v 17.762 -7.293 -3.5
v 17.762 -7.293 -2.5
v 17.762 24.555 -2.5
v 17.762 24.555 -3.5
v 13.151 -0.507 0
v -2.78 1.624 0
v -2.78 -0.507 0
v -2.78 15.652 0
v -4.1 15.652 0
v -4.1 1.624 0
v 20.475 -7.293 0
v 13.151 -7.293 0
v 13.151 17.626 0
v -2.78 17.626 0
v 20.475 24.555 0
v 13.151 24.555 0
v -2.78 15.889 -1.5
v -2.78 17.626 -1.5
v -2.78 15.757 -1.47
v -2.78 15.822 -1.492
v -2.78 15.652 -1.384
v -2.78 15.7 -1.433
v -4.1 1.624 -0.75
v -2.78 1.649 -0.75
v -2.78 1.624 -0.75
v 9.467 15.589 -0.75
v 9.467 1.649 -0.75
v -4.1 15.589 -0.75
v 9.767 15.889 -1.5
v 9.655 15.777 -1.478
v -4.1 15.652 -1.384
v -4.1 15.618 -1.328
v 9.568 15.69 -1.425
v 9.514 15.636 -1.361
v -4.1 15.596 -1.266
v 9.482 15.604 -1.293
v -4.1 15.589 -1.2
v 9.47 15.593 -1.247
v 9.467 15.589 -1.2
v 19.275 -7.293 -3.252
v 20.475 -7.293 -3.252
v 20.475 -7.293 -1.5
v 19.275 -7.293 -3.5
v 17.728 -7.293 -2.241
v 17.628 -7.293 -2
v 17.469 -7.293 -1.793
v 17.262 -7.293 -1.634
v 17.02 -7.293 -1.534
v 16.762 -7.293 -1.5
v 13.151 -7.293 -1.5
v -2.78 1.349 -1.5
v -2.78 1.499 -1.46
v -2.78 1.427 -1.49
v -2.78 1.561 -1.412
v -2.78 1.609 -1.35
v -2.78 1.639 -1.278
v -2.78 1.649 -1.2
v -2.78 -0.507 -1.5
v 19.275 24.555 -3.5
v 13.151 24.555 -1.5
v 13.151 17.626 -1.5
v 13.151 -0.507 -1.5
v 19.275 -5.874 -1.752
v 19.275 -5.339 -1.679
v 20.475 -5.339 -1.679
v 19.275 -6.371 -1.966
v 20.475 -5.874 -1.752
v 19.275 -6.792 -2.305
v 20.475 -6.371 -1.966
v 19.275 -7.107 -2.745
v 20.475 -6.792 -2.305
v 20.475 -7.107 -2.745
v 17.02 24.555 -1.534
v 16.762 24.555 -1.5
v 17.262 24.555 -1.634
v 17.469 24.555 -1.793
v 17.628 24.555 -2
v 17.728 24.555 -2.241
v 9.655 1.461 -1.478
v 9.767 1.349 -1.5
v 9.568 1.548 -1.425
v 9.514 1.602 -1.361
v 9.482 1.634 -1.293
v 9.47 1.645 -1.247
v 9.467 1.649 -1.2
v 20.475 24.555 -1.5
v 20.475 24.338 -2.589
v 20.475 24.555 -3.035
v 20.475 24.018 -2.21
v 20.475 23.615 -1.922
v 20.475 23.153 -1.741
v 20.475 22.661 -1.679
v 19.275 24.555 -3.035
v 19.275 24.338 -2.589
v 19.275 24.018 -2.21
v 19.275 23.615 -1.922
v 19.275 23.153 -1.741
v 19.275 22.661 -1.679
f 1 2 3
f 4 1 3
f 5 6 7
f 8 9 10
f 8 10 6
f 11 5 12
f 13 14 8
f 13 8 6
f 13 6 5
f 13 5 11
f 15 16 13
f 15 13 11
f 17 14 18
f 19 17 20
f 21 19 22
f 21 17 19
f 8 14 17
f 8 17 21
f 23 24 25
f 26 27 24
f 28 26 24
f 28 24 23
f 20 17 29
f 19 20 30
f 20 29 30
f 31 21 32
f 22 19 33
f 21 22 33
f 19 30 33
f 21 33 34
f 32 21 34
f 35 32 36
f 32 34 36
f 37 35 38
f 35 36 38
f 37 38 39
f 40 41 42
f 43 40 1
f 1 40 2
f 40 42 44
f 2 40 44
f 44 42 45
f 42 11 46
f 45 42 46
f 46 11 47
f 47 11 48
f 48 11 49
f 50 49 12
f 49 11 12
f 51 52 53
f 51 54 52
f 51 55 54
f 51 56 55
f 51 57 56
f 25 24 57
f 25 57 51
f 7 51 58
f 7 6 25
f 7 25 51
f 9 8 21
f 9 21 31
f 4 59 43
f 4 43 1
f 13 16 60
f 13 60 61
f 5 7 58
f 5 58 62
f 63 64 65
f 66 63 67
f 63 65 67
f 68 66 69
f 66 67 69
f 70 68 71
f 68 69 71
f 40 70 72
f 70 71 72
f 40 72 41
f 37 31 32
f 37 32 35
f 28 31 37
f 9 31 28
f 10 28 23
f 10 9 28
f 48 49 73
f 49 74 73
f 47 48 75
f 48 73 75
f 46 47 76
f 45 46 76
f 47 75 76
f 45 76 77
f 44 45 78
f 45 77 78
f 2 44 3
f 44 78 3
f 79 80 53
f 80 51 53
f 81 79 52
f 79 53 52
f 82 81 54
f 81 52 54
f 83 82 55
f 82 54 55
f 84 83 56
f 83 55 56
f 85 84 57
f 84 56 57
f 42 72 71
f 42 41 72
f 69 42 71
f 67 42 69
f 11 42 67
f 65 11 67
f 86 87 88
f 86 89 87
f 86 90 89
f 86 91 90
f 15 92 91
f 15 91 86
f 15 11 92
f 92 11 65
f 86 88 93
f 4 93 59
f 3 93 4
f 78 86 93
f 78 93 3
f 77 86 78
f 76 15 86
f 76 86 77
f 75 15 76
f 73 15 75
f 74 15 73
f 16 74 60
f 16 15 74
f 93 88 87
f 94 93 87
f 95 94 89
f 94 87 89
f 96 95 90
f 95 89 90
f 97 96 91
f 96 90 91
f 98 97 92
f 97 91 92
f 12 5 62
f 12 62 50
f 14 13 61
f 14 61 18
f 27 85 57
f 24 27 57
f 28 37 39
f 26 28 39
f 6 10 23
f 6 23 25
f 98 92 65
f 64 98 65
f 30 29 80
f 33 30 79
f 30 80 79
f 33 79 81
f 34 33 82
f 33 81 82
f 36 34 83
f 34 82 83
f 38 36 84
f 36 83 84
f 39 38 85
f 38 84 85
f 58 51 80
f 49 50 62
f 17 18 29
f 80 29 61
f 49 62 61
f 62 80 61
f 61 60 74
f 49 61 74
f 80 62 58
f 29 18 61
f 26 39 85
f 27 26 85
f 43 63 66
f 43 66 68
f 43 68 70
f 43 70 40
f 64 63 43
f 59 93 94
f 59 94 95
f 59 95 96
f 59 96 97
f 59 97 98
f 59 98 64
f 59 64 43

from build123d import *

# Parameters (mm, degrees)
BOSS_EXTRUDE1_DEPTH = 1.5
SKETCH2_W           = 2.713539356
SKETCH2_H           = 31.847242959
BOSS_EXTRUDE2_DEPTH = 2
CUT_EXTRUDE1_DEPTH  = 0.75
FILLET1_R           = 1
FILLET2_R           = 0.3
CUT_EXTRUDE2_DEPTH  = 1.2


with BuildPart() as part:
    # Sketch1 → Boss-Extrude1 (new body)
    with BuildSketch(Plane.XY):
        Polygon((13.150722075, -0.506964629), (13.150722075, -7.292554302), (20.475117676, -7.292554302), (20.475117676, 24.554688657), (13.150722075, 24.554688657), (13.150722075, 17.625640453), (-2.779550764, 17.625640453), (-2.779550764, 15.652441277), (-4.09999988, 15.652441277), (-4.09999988, 1.623886225), (-2.779550764, 1.623886225), (-2.779550764, -0.506964629), align=None)
    extrude(amount=-BOSS_EXTRUDE1_DEPTH)

    # Sketch2 → Boss-Extrude2 (add)
    with BuildSketch(Plane(origin=(0, 0, -1.5), x_dir=(-1, 0, 0), z_dir=(0, 0, -1))):
        with Locations((-19.118347998, 8.631067178)):
            Rectangle(SKETCH2_W, SKETCH2_H)
    extrude(amount=BOSS_EXTRUDE2_DEPTH)

    # Sketch3 → Cut-Extrude1 (cut)
    with BuildSketch(Plane(origin=(0, 0, -1.5), x_dir=(-1, 0, 0), z_dir=(0, 0, -1))):
        Polygon((2.779550764, 15.589201664), (-9.466641169, 15.589201664), (-9.466641169, 1.649000414), (2.779550764, 1.649000414), (2.779550764, 1.623886225), (4.09999988, 1.623886225), (4.09999988, 15.589201664), align=None)
    extrude(amount=-CUT_EXTRUDE1_DEPTH, mode=Mode.SUBTRACT)

    # Fillet1
    fillet1_edges = [part.edges().sort_by_distance(p)[0] for p in [
        (17.76157832, 8.631067178, -1.5),
    ]]
    fillet(fillet1_edges, radius=FILLET1_R)

    # Fillet2
    fillet2_edges = [part.edges().sort_by_distance(p)[0] for p in [
        (3.343545202, 1.649000414, -1.5),
        (9.466641169, 8.619101039, -1.5),
        (2.683320645, 15.589201664, -1.5),
    ]]
    fillet(fillet2_edges, radius=FILLET2_R)

    # Sketch4 → Cut-Extrude2 (cut)
    with BuildSketch(Plane(origin=(20.475117676, 0, 0), x_dir=(0, 0, -1), z_dir=(1, 0, 0))):
        with BuildLine():
            Line((1.679428172, 22.66130131), (1.679429396, -5.33869869))
            ThreePointArc((1.679429396, -5.33869869), (2.265215896, -6.752912227), (3.679429484, -7.338698602))
            Line((3.679429484, -7.338698602), (3.679428085, 24.661301398))
            ThreePointArc((3.679428085, 24.661301398), (2.265214548, 24.075514898), (1.679428172, 22.66130131))
        make_face()
    extrude(amount=-CUT_EXTRUDE2_DEPTH, mode=Mode.SUBTRACT)


solid = part.part
